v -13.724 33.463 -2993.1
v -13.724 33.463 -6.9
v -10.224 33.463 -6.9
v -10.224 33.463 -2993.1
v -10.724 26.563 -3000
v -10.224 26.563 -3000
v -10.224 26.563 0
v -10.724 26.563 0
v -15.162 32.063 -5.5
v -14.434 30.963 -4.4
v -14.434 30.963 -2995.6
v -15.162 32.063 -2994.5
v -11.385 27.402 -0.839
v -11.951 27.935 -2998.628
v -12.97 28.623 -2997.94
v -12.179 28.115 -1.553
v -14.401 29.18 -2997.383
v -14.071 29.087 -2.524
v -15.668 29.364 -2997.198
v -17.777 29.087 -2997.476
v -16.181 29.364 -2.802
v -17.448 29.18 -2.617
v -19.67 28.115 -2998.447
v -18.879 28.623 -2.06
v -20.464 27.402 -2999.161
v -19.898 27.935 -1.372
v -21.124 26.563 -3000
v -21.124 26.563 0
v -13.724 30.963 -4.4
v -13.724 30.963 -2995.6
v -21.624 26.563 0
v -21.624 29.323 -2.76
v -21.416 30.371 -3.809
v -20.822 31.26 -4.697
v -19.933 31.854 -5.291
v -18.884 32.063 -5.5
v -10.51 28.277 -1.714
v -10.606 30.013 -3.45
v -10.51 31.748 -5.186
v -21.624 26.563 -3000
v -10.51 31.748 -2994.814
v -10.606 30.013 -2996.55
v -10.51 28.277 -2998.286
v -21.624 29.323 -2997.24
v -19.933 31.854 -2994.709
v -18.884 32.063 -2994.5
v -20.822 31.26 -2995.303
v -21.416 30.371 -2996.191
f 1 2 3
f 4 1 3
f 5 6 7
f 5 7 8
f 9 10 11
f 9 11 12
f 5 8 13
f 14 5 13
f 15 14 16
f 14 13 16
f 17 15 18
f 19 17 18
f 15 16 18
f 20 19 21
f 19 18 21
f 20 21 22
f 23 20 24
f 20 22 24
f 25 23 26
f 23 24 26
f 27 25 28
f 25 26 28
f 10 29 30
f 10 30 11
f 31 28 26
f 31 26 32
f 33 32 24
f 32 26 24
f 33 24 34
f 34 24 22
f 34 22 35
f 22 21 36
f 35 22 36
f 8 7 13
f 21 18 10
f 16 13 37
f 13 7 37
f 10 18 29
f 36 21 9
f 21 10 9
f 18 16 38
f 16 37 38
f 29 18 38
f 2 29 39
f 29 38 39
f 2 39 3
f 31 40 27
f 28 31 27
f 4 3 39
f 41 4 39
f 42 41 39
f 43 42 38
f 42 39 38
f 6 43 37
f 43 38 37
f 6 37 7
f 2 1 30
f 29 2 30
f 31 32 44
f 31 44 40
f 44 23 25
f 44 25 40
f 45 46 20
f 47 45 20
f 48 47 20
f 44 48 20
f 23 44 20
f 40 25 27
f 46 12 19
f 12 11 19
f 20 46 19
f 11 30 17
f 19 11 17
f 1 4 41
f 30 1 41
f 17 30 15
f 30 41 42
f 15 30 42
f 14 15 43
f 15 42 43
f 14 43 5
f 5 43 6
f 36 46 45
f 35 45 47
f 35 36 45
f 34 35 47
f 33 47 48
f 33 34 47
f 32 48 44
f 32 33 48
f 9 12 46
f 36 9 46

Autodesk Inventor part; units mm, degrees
ref_plane "YZ Plane" through (0, 0, 0) normal (1, 0, 0) x (0, 1, 0)
sketch "Boceto3" plane through (0, 0, 0) normal (0, 0, 1) x (1, 0, 0)
  line L0 (-15.1624, 32.0626) -> (-18.8843, 32.0626)
  line L1 (-13.7243, 33.4626) -> (-13.7243, 30.9626)
  line L2 (-13.7243, 30.9626) -> (-14.4343, 30.9626)
  line L3 (-14.4343, 30.9626) -> (-15.1624, 32.0626)
  arc A0 (-18.8843, 32.0626) -> (-21.6243, 29.3226) centre (-18.8843, 29.3226) ccw
  line L4 (-13.7243, 33.4626) -> (-10.2243, 33.4626)
  line L5 (-21.6243, 29.3226) -> (-21.6243, 26.5626)
  arc A1 (-10.2243, 33.4626) -> (-10.2243, 26.5626) centre (5.1794, 30.0126) ccw
  line L6 (-21.6243, 26.5626) -> (-21.1243, 26.5626)
  line L7 (-10.2243, 26.5626) -> (-10.7243, 26.5626)
  arc A2 (-10.7243, 26.5626) -> (-21.1243, 26.5626) centre (-15.9243, 23.1493) ccw
  dimension "d218" = 2.5
  dimension "d219" = 0.71
  dimension "d221" = 33.5
  dimension "d223" = 2.74
  dimension "d281" = 3.5
  dimension "d288" = 2.76
  dimension "d291" = 0.5
  dimension "d292" = 0.5
extrude "Extrusión4" add sketch "Boceto3" against normal blind 3000
ref_plane "Plano de trabajo2" through (-10.2243, 33.4626, 0) normal (-1, 0, 0) x (0, 0, -1)
ref_plane "Plano de trabajo4" through (0, 0, -1500) normal (0, 0, 1) x (1, 0, 0)
sketch "Boceto5" plane through (-10.2243, 33.4626, 0) normal (-1, 0, 0) x (0, 0, -1)
  line L0 (0, 0) -> (0, 6.9) projected
  line L1 (0, 6.9) -> (6.9, 0)
  line L2 (0, 0) -> (3000, 0) projected
  line L3 (6.9, 0) -> (0, 0)
  line L4 (0, 0) -> (0, 6.9)
  point P0 (0, 33.4626)
  dimension "d296" = 45
extrude "Extrusión6" cut sketch "Boceto5" along normal through all
mirror "Simetría3" about plane through (0, 0, -1500) normal (0, 0, 1) of "Extrusión6"
properties part number "SP40-10 JUNTA INT CRISTAL" material "Caucho"
